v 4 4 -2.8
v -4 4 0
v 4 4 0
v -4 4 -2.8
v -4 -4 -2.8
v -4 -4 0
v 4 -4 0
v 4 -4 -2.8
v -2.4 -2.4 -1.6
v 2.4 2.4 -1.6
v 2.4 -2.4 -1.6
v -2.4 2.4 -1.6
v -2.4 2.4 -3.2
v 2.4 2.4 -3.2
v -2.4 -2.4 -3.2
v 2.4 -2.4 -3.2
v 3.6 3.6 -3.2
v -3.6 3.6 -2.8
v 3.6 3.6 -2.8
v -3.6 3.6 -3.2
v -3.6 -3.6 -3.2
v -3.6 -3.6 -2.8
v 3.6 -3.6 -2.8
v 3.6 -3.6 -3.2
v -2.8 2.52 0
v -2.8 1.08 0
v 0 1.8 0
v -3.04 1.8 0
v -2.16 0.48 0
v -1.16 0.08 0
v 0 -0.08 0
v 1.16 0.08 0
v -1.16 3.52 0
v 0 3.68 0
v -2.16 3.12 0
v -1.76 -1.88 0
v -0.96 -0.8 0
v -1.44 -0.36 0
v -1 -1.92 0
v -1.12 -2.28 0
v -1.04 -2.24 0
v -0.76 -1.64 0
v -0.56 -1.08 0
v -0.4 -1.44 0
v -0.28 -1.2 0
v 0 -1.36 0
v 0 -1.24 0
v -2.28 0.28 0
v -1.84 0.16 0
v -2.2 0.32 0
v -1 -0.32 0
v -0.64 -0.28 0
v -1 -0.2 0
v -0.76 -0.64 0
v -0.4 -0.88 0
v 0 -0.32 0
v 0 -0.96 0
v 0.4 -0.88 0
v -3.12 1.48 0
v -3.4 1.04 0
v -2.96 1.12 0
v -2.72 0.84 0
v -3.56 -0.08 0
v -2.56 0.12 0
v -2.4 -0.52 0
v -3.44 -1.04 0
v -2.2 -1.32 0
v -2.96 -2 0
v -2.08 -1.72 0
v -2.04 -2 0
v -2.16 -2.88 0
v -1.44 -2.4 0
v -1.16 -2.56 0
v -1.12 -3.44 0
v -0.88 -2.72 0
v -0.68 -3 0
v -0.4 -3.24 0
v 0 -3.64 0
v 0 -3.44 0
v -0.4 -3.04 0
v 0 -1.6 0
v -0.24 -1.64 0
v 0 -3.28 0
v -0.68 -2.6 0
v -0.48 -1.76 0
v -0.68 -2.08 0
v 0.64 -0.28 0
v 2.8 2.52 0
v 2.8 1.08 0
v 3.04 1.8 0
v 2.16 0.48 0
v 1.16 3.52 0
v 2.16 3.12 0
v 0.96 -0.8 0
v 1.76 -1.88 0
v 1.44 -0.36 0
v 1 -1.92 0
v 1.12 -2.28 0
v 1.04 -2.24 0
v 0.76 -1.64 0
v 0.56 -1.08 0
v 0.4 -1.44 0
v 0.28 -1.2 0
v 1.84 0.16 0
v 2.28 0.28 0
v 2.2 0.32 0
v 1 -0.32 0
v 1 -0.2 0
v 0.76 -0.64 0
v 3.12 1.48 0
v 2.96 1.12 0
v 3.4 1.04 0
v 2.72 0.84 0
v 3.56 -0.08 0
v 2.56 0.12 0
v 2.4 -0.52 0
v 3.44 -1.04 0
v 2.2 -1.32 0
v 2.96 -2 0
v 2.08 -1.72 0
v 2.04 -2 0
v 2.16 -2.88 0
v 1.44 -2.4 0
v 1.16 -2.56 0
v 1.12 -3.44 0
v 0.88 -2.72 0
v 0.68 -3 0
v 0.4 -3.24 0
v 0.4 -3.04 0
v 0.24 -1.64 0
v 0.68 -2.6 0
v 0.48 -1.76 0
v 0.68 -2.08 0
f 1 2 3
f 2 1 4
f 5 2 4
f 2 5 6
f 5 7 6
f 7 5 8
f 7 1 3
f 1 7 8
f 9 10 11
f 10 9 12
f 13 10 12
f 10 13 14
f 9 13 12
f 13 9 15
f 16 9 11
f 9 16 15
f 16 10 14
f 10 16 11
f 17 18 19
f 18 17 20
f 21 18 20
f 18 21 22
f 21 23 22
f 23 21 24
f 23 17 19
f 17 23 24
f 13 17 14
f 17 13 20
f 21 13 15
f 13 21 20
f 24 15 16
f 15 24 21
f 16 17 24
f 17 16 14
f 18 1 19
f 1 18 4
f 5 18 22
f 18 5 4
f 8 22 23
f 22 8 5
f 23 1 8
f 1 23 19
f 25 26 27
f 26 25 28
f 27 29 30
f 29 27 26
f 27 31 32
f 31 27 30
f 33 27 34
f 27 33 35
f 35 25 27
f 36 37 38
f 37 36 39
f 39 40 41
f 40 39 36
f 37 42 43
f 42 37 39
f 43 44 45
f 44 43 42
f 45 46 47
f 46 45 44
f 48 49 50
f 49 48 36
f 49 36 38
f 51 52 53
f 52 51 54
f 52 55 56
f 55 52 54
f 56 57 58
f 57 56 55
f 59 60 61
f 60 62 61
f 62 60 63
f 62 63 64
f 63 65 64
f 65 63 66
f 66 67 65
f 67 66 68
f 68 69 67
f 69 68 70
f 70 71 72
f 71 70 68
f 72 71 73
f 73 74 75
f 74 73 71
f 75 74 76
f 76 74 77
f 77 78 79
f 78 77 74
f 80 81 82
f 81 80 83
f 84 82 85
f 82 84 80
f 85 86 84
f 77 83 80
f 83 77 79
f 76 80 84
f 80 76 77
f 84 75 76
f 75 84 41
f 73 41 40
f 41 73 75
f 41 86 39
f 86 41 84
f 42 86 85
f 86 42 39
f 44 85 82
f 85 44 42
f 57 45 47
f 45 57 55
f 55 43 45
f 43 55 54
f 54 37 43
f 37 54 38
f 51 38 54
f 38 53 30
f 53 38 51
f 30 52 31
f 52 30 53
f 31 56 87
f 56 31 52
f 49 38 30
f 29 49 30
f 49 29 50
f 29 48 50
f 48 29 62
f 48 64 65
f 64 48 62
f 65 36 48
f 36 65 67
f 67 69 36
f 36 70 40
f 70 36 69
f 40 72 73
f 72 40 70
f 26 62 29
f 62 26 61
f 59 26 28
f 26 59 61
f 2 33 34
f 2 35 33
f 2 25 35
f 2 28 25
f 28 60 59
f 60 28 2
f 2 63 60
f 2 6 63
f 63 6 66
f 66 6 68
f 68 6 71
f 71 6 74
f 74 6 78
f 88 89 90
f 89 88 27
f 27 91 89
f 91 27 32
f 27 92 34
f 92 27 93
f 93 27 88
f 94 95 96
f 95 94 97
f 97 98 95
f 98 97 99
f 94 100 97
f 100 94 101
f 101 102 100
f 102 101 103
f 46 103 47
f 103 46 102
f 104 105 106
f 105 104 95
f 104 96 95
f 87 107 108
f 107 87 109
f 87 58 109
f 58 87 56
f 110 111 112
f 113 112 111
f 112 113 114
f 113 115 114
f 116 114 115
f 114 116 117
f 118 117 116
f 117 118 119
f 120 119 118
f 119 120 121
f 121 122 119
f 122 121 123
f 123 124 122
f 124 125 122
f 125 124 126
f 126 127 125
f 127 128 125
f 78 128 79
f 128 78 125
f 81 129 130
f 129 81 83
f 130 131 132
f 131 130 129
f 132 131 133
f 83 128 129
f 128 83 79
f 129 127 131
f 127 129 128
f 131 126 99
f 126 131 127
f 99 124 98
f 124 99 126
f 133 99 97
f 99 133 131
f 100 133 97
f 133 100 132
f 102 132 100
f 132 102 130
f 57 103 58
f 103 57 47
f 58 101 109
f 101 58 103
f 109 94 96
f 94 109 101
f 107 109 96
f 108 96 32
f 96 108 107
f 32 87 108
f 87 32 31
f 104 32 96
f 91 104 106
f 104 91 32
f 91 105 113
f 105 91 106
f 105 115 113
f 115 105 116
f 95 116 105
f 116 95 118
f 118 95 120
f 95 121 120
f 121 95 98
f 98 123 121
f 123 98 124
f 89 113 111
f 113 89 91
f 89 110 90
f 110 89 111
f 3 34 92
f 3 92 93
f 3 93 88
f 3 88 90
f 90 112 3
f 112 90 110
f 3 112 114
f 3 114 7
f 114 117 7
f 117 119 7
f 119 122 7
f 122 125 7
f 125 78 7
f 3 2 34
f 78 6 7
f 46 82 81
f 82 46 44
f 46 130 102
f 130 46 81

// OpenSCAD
// file: ../p/box5.scad
use <../lib.scad>
function ldraw_lib__box5() = [
// 0 Box with 5 Faces and All Edges
// 0 Name: box5.dat
// 0 Author: James Jessiman
// 0 !LDRAW_ORG Primitive UPDATE 2012-01
// 0 !LICENSE Licensed under CC BY 2.0 and CC BY 4.0 : see CAreadme.txt
// 
// 0 BFC CERTIFY CCW
  [0,"BFC","CERTIFY"],
  [0,"BFC","CCW"],
// 
// 0 !HISTORY 2002-04-03 [sbliss] Modified for BFC compliance
// 0 !HISTORY 2002-04-25 [PTadmin] Official Update 2002-02
// 0 !HISTORY 2007-06-24 [PTadmin] Header formatted for Contributor Agreement
// 0 !HISTORY 2008-07-01 [PTadmin] Official Update 2008-01
// 0 !HISTORY 2012-02-16 [Philo] Changed to CCW
// 0 !HISTORY 2012-03-30 [PTadmin] Official Update 2012-01
// 
// 
// 2 24 1 1 1 -1 1 1
  [2,24,1,1,1,-1,1,1],
// 2 24 -1 1 1 -1 1 -1
  [2,24,-1,1,1,-1,1,-1],
// 2 24 -1 1 -1 1 1 -1
  [2,24,-1,1,-1,1,1,-1],
// 2 24 1 1 -1 1 1 1
  [2,24,1,1,-1,1,1,1],
// 2 24 1 0 1 -1 0 1
  [2,24,1,0,1,-1,0,1],
// 2 24 -1 0 1 -1 0 -1
  [2,24,-1,0,1,-1,0,-1],
// 2 24 -1 0 -1 1 0 -1
  [2,24,-1,0,-1,1,0,-1],
// 2 24 1 0 -1 1 0 1
  [2,24,1,0,-1,1,0,1],
// 2 24 1 0 1 1 1 1
  [2,24,1,0,1,1,1,1],
// 2 24 -1 0 1 -1 1 1
  [2,24,-1,0,1,-1,1,1],
// 2 24 1 0 -1 1 1 -1
  [2,24,1,0,-1,1,1,-1],
// 2 24 -1 0 -1 -1 1 -1
  [2,24,-1,0,-1,-1,1,-1],
// 4 16 -1 1 1 1 1 1 1 1 -1 -1 1 -1
  [4,16,-1,1,1,1,1,1,1,1,-1,-1,1,-1],
// 4 16 -1 1 1 -1 0 1 1 0 1 1 1 1
  [4,16,-1,1,1,-1,0,1,1,0,1,1,1,1],
// 4 16 -1 1 -1 -1 0 -1 -1 0 1 -1 1 1
  [4,16,-1,1,-1,-1,0,-1,-1,0,1,-1,1,1],
// 4 16 1 1 -1 1 0 -1 -1 0 -1 -1 1 -1
  [4,16,1,1,-1,1,0,-1,-1,0,-1,-1,1,-1],
// 4 16 1 1 1 1 0 1 1 0 -1 1 1 -1
  [4,16,1,1,1,1,0,1,1,0,-1,1,1,-1],
];
module ldraw_lib__box5(step=0, col=false, unit=2/5, alt=false, line=0.2, solid=!$preview)
    makepoly(ldraw_lib__box5(), step=step, col=col, unit=unit, alt=alt, line=line, solid=solid);
ldraw_lib__box5(line=0.2);
// file: ../p/box4.scad
use <../lib.scad>
function ldraw_lib__box4() = [
// 0 Box with 4 Faces (2 Parallel Pairs) and All Edges
// 0 Name: box4.dat
// 0 Author: James Jessiman
// 0 !LDRAW_ORG Primitive UPDATE 2012-01
// 0 !LICENSE Licensed under CC BY 2.0 and CC BY 4.0 : see CAreadme.txt
// 
// 0 BFC CERTIFY CCW
  [0,"BFC","CERTIFY"],
  [0,"BFC","CCW"],
// 
// 0 !HISTORY 2002-04-03 [sbliss] Modified for BFC compliance
// 0 !HISTORY 2002-04-25 [PTadmin] Official Update 2002-02
// 0 !HISTORY 2007-06-24 [PTadmin] Header formatted for Contributor Agreement
// 0 !HISTORY 2008-07-01 [PTadmin] Official Update 2008-01
// 0 !HISTORY 2012-02-16 [Philo] Changed to CCW
// 0 !HISTORY 2012-03-30 [PTadmin] Official Update 2012-01
// 
// 
// 2 24 1 1 1 -1 1 1
  [2,24,1,1,1,-1,1,1],
// 2 24 -1 1 1 -1 1 -1
  [2,24,-1,1,1,-1,1,-1],
// 2 24 -1 1 -1 1 1 -1
  [2,24,-1,1,-1,1,1,-1],
// 2 24 1 1 -1 1 1 1
  [2,24,1,1,-1,1,1,1],
// 2 24 1 0 1 -1 0 1
  [2,24,1,0,1,-1,0,1],
// 2 24 -1 0 1 -1 0 -1
  [2,24,-1,0,1,-1,0,-1],
// 2 24 -1 0 -1 1 0 -1
  [2,24,-1,0,-1,1,0,-1],
// 2 24 1 0 -1 1 0 1
  [2,24,1,0,-1,1,0,1],
// 2 24 1 0 1 1 1 1
  [2,24,1,0,1,1,1,1],
// 2 24 -1 0 1 -1 1 1
  [2,24,-1,0,1,-1,1,1],
// 2 24 1 0 -1 1 1 -1
  [2,24,1,0,-1,1,1,-1],
// 2 24 -1 0 -1 -1 1 -1
  [2,24,-1,0,-1,-1,1,-1],
// 4 16 -1 1 1 -1 0 1 1 0 1 1 1 1
  [4,16,-1,1,1,-1,0,1,1,0,1,1,1,1],
// 4 16 -1 1 -1 -1 0 -1 -1 0 1 -1 1 1
  [4,16,-1,1,-1,-1,0,-1,-1,0,1,-1,1,1],
// 4 16 1 1 -1 1 0 -1 -1 0 -1 -1 1 -1
  [4,16,1,1,-1,1,0,-1,-1,0,-1,-1,1,-1],
// 4 16 1 1 1 1 0 1 1 0 -1 1 1 -1
  [4,16,1,1,1,1,0,1,1,0,-1,1,1,-1],
];
module ldraw_lib__box4(step=0, col=false, unit=2/5, alt=false, line=0.2, solid=!$preview)
    makepoly(ldraw_lib__box4(), step=step, col=col, unit=unit, alt=alt, line=line, solid=solid);
ldraw_lib__box4(line=0.2);
// file: s/3070bs01.scad
use <../../lib.scad>
use <../../p/box4.scad>
use <../../p/box5.scad>
function ldraw_lib__s__3070bs01() = [
// 0 ~Tile  1 x  1 with Groove without Top Face
// 0 Name: s\3070bs01.dat
// 0 Author: Chris Dee [cwdee]
// 0 !LDRAW_ORG Subpart UPDATE 2009-02
// 0 !LICENSE Licensed under CC BY 2.0 and CC BY 4.0 : see CAreadme.txt
// 
// 0 BFC CERTIFY CCW
  [0,"BFC","CERTIFY"],
  [0,"BFC","CCW"],
// 
// 0 !HISTORY 2009-09-03 [PTadmin] Official Update 2009-02
// 
// 
// 1 16 0 0 0 10 0 0 0 7 0 0 0 10 box4.dat
  [1,16,0,0,0,10,0,0,0,7,0,0,0,10, ldraw_lib__box4()],
// 0 BFC INVERTNEXT
  [0,"BFC","INVERTNEXT"],
// 1 16 0 8 0 6 0 0 0 -4 0 0 0 6 box5.dat
  [1,16,0,8,0,6,0,0,0,-4,0,0,0,6, ldraw_lib__box5()],
// 1 16 0 7 0 9 0 0 0 1 0 0 0 9 box4.dat
  [1,16,0,7,0,9,0,0,0,1,0,0,0,9, ldraw_lib__box4()],
// 
// 4 16 9 8 9 6 8 6 -6 8 6 -9 8 9
  [4,16,9,8,9,6,8,6,-6,8,6,-9,8,9],
// 4 16 -9 8 9 -6 8 6 -6 8 -6 -9 8 -9
  [4,16,-9,8,9,-6,8,6,-6,8,-6,-9,8,-9],
// 4 16 -9 8 -9 -6 8 -6 6 8 -6 9 8 -9
  [4,16,-9,8,-9,-6,8,-6,6,8,-6,9,8,-9],
// 4 16 9 8 -9 6 8 -6 6 8 6 9 8 9
  [4,16,9,8,-9,6,8,-6,6,8,6,9,8,9],
// 
// 4 16 10 7 10 9 7 9 -9 7 9 -10 7 10
  [4,16,10,7,10,9,7,9,-9,7,9,-10,7,10],
// 4 16 -10 7 10 -9 7 9 -9 7 -9 -10 7 -10
  [4,16,-10,7,10,-9,7,9,-9,7,-9,-10,7,-10],
// 4 16 -10 7 -10 -9 7 -9 9 7 -9 10 7 -10
  [4,16,-10,7,-10,-9,7,-9,9,7,-9,10,7,-10],
// 4 16 10 7 -10 9 7 -9 9 7 9 10 7 10
  [4,16,10,7,-10,9,7,-9,9,7,9,10,7,10],
// 0
];
module ldraw_lib__s__3070bs01(step=0, col=false, unit=2/5, alt=false, line=0.2, solid=!$preview)
    makepoly(ldraw_lib__s__3070bs01(), step=step, col=col, unit=unit, alt=alt, line=line, solid=solid);
ldraw_lib__s__3070bs01(line=0.2);
// main file
use <../lib.scad>
use <s/3070bs01.scad>
function ldraw_lib__3070bp60() = [
// 0 Tile  1 x  1 with Green Oval Pattern
// 0 Name: 3070bp60.dat
// 0 Author: Nils Schmidt [BlackBrick89]
// 0 !LDRAW_ORG Part UPDATE 2012-02
// 0 !LICENSE Licensed under CC BY 2.0 and CC BY 4.0 : see CAreadme.txt
// 
// 0 BFC CERTIFY CCW
  [0,"BFC","CERTIFY"],
  [0,"BFC","CCW"],
// 
// 0 !KEYWORDS Life on Mars
// 
// 0 !HISTORY 2012-08-09 [PTadmin] Official Update 2012-02
// 
// 
// 1 16 0 0 0 1 0 0 0 1 0 0 0 1 s\3070bs01.dat
  [1,16,0,0,0,1,0,0,0,1,0,0,0,1, ldraw_lib__s__3070bs01()],
// 
// 4 120 0 0 4.5 -7 0 6.3 -7.6 0 4.5 -7 0 2.7
  [4,120,0,0,4.5,-7,0,6.3,-7.6,0,4.5,-7,0,2.7],
// 4 120 0 0 4.5 -7 0 2.7 -5.4 0 1.2 -2.9 0 0.2
  [4,120,0,0,4.5,-7,0,2.7,-5.4,0,1.2,-2.9,0,0.2],
// 4 120 0 0 4.5 -2.9 0 0.2 0 0 -0.2 2.9 0 0.2
  [4,120,0,0,4.5,-2.9,0,0.2,0,0,-0.2,2.9,0,0.2],
// 4 120 0 0 4.5 0 0 9.2 -2.9 0 8.8 -5.4 0 7.8
  [4,120,0,0,4.5,0,0,9.2,-2.9,0,8.8,-5.4,0,7.8],
// 3 120 -5.4 0 7.8 -7 0 6.3 0 0 4.5
  [3,120,-5.4,0,7.8,-7,0,6.3,0,0,4.5],
// 4 120 -2.4 0 -2 -3.6 0 -0.9 -4.4 0 -4.7 -2.5 0 -4.8
  [4,120,-2.4,0,-2,-3.6,0,-0.9,-4.4,0,-4.7,-2.5,0,-4.8],
// 4 120 -4.4 0 -4.7 -2.8 0 -5.7 -2.6 0 -5.6 -2.5 0 -4.8
  [4,120,-4.4,0,-4.7,-2.8,0,-5.7,-2.6,0,-5.6,-2.5,0,-4.8],
// 4 120 -2.4 0 -2 -2.5 0 -4.8 -1.9 0 -4.1 -1.4 0 -2.7
  [4,120,-2.4,0,-2,-2.5,0,-4.8,-1.9,0,-4.1,-1.4,0,-2.7],
// 4 120 -1.4 0 -2.7 -1.9 0 -4.1 -1 0 -3.6 -0.7 0 -3
  [4,120,-1.4,0,-2.7,-1.9,0,-4.1,-1,0,-3.6,-0.7,0,-3],
// 4 120 -0.7 0 -3 -1 0 -3.6 0 0 -3.4 0 0 -3.1
  [4,120,-0.7,0,-3,-1,0,-3.6,0,0,-3.4,0,0,-3.1],
// 4 120 -5.5 0 0.8 -5.7 0 0.7 -4.4 0 -4.7 -4.6 0 0.4
  [4,120,-5.5,0,0.8,-5.7,0,0.7,-4.4,0,-4.7,-4.6,0,0.4],
// 3 120 -4.6 0 0.4 -4.4 0 -4.7 -3.6 0 -0.9
  [3,120,-4.6,0,0.4,-4.4,0,-4.7,-3.6,0,-0.9],
// 4 71 -1.6 0 -0.7 -2.5 0 -0.5 -2.5 0 -0.8 -1.9 0 -1.6
  [4,71,-1.6,0,-0.7,-2.5,0,-0.5,-2.5,0,-0.8,-1.9,0,-1.6],
// 4 71 -1.6 0 -0.7 -1.9 0 -1.6 -1 0 -2.2 0 0 -0.8
  [4,71,-1.6,0,-0.7,-1.9,0,-1.6,-1,0,-2.2,0,0,-0.8],
// 4 71 0 0 -0.8 -1 0 -2.2 0 0 -2.4 1 0 -2.2
  [4,71,0,0,-0.8,-1,0,-2.2,0,0,-2.4,1,0,-2.2],
// 3 71 -7.8 0 3.7 -8.5 0 2.6 -7.4 0 2.8
  [3,71,-7.8,0,3.7,-8.5,0,2.6,-7.4,0,2.8],
// 4 71 -6.8 0 2.1 -7.4 0 2.8 -8.5 0 2.6 -8.9 0 -0.2
  [4,71,-6.8,0,2.1,-7.4,0,2.8,-8.5,0,2.6,-8.9,0,-0.2],
// 3 71 -6.8 0 2.1 -8.9 0 -0.2 -6.4 0 0.3
  [3,71,-6.8,0,2.1,-8.9,0,-0.2,-6.4,0,0.3],
// 4 71 -8.9 0 -0.2 -8.6 0 -2.6 -6 0 -1.3 -6.4 0 0.3
  [4,71,-8.9,0,-0.2,-8.6,0,-2.6,-6,0,-1.3,-6.4,0,0.3],
// 4 71 -8.6 0 -2.6 -7.4 0 -5 -5.5 0 -3.3 -6 0 -1.3
  [4,71,-8.6,0,-2.6,-7.4,0,-5,-5.5,0,-3.3,-6,0,-1.3],
// 4 71 -7.4 0 -5 -5.1 0 -5 -5.2 0 -4.3 -5.5 0 -3.3
  [4,71,-7.4,0,-5,-5.1,0,-5,-5.2,0,-4.3,-5.5,0,-3.3],
// 4 71 -5.1 0 -5 -7.4 0 -5 -5.4 0 -7.2 -3.6 0 -6
  [4,71,-5.1,0,-5,-7.4,0,-5,-5.4,0,-7.2,-3.6,0,-6],
// 3 71 -3.6 0 -6 -5.4 0 -7.2 -2.9 0 -6.4
  [3,71,-3.6,0,-6,-5.4,0,-7.2,-2.9,0,-6.4],
// 4 71 -2.2 0 -6.8 -2.9 0 -6.4 -5.4 0 -7.2 -2.8 0 -8.6
  [4,71,-2.2,0,-6.8,-2.9,0,-6.4,-5.4,0,-7.2,-2.8,0,-8.6],
// 3 71 -2.2 0 -6.8 -2.8 0 -8.6 -1.7 0 -7.5
  [3,71,-2.2,0,-6.8,-2.8,0,-8.6,-1.7,0,-7.5],
// 3 71 -1.7 0 -7.5 -2.8 0 -8.6 -1 0 -8.1
  [3,71,-1.7,0,-7.5,-2.8,0,-8.6,-1,0,-8.1],
// 4 71 0 0 -8.6 -1 0 -8.1 -2.8 0 -8.6 0 0 -9.1
  [4,71,0,0,-8.6,-1,0,-8.1,-2.8,0,-8.6,0,0,-9.1],
// 4 4 0 0 -8.2 0 0 -4 -0.6 0 -4.1 -1 0 -7.6
  [4,4,0,0,-8.2,0,0,-4,-0.6,0,-4.1,-1,0,-7.6],
// 4 4 -1 0 -7.6 -0.6 0 -4.1 -1.2 0 -4.4 -1.7 0 -6.5
  [4,4,-1,0,-7.6,-0.6,0,-4.1,-1.2,0,-4.4,-1.7,0,-6.5],
// 3 4 -1.2 0 -4.4 -1.7 0 -5.2 -1.7 0 -6.5
  [3,4,-1.2,0,-4.4,-1.7,0,-5.2,-1.7,0,-6.5],
// 4 16 -1 0 -8.1 0 0 -8.6 0 0 -8.2 -1 0 -7.6
  [4,16,-1,0,-8.1,0,0,-8.6,0,0,-8.2,-1,0,-7.6],
// 4 16 -1.7 0 -7.5 -1 0 -8.1 -1 0 -7.6 -1.7 0 -6.5
  [4,16,-1.7,0,-7.5,-1,0,-8.1,-1,0,-7.6,-1.7,0,-6.5],
// 4 16 -2.2 0 -6.8 -1.7 0 -7.5 -1.7 0 -6.5 -2.6 0 -5.6
  [4,16,-2.2,0,-6.8,-1.7,0,-7.5,-1.7,0,-6.5,-2.6,0,-5.6],
// 4 16 -2.6 0 -5.6 -2.8 0 -5.7 -2.9 0 -6.4 -2.2 0 -6.8
  [4,16,-2.6,0,-5.6,-2.8,0,-5.7,-2.9,0,-6.4,-2.2,0,-6.8],
// 4 16 -1.7 0 -5.2 -2.5 0 -4.8 -2.6 0 -5.6 -1.7 0 -6.5
  [4,16,-1.7,0,-5.2,-2.5,0,-4.8,-2.6,0,-5.6,-1.7,0,-6.5],
// 4 16 -1.9 0 -4.1 -2.5 0 -4.8 -1.7 0 -5.2 -1.2 0 -4.4
  [4,16,-1.9,0,-4.1,-2.5,0,-4.8,-1.7,0,-5.2,-1.2,0,-4.4],
// 4 16 -1 0 -3.6 -1.9 0 -4.1 -1.2 0 -4.4 -0.6 0 -4.1
  [4,16,-1,0,-3.6,-1.9,0,-4.1,-1.2,0,-4.4,-0.6,0,-4.1],
// 4 16 -0.7 0 -3 0 0 -3.1 0 0 -2.4 -1 0 -2.2
  [4,16,-0.7,0,-3,0,0,-3.1,0,0,-2.4,-1,0,-2.2],
// 4 16 -1.4 0 -2.7 -0.7 0 -3 -1 0 -2.2 -1.9 0 -1.6
  [4,16,-1.4,0,-2.7,-0.7,0,-3,-1,0,-2.2,-1.9,0,-1.6],
// 4 16 -2.4 0 -2 -1.4 0 -2.7 -1.9 0 -1.6 -3.6 0 -0.9
  [4,16,-2.4,0,-2,-1.4,0,-2.7,-1.9,0,-1.6,-3.6,0,-0.9],
// 3 16 -2.5 0 -0.8 -3.6 0 -0.9 -1.9 0 -1.6
  [3,16,-2.5,0,-0.8,-3.6,0,-0.9,-1.9,0,-1.6],
// 4 16 -2.9 0 0.2 -3.6 0 -0.9 -2.5 0 -0.8 -2.5 0 -0.5
  [4,16,-2.9,0,0.2,-3.6,0,-0.9,-2.5,0,-0.8,-2.5,0,-0.5],
// 4 16 -2.9 0 0.2 -2.5 0 -0.5 -1.6 0 -0.7 0 0 -0.2
  [4,16,-2.9,0,0.2,-2.5,0,-0.5,-1.6,0,-0.7,0,0,-0.2],
// 4 16 0 0 -0.2 -1.6 0 -0.7 0 0 -0.8 1.6 0 -0.7
  [4,16,0,0,-0.2,-1.6,0,-0.7,0,0,-0.8,1.6,0,-0.7],
// 3 16 -4.6 0 0.4 -3.6 0 -0.9 -2.9 0 0.2
  [3,16,-4.6,0,0.4,-3.6,0,-0.9,-2.9,0,0.2],
// 4 16 -4.6 0 0.4 -2.9 0 0.2 -5.4 0 1.2 -5.5 0 0.8
  [4,16,-4.6,0,0.4,-2.9,0,0.2,-5.4,0,1.2,-5.5,0,0.8],
// 4 16 -5.7 0 0.7 -5.5 0 0.8 -5.4 0 1.2 -6.8 0 2.1
  [4,16,-5.7,0,0.7,-5.5,0,0.8,-5.4,0,1.2,-6.8,0,2.1],
// 4 16 -5.7 0 0.7 -6.8 0 2.1 -6.4 0 0.3 -6 0 -1.3
  [4,16,-5.7,0,0.7,-6.8,0,2.1,-6.4,0,0.3,-6,0,-1.3],
// 4 16 -4.4 0 -4.7 -5.7 0 0.7 -6 0 -1.3 -5.5 0 -3.3
  [4,16,-4.4,0,-4.7,-5.7,0,0.7,-6,0,-1.3,-5.5,0,-3.3],
// 3 16 -5.5 0 -3.3 -5.2 0 -4.3 -4.4 0 -4.7
  [3,16,-5.5,0,-3.3,-5.2,0,-4.3,-4.4,0,-4.7],
// 4 16 -4.4 0 -4.7 -5.2 0 -4.3 -5.1 0 -5 -2.8 0 -5.7
  [4,16,-4.4,0,-4.7,-5.2,0,-4.3,-5.1,0,-5,-2.8,0,-5.7],
// 4 16 -2.8 0 -5.7 -5.1 0 -5 -3.6 0 -6 -2.9 0 -6.4
  [4,16,-2.8,0,-5.7,-5.1,0,-5,-3.6,0,-6,-2.9,0,-6.4],
// 4 16 -6.8 0 2.1 -5.4 0 1.2 -7 0 2.7 -7.4 0 2.8
  [4,16,-6.8,0,2.1,-5.4,0,1.2,-7,0,2.7,-7.4,0,2.8],
// 4 16 -7.8 0 3.7 -7.4 0 2.8 -7 0 2.7 -7.6 0 4.5
  [4,16,-7.8,0,3.7,-7.4,0,2.8,-7,0,2.7,-7.6,0,4.5],
// 3 16 -10 0 10 -2.9 0 8.8 0 0 9.2
  [3,16,-10,0,10,-2.9,0,8.8,0,0,9.2],
// 3 16 -10 0 10 -5.4 0 7.8 -2.9 0 8.8
  [3,16,-10,0,10,-5.4,0,7.8,-2.9,0,8.8],
// 3 16 -10 0 10 -7 0 6.3 -5.4 0 7.8
  [3,16,-10,0,10,-7,0,6.3,-5.4,0,7.8],
// 3 16 -10 0 10 -7.6 0 4.5 -7 0 6.3
  [3,16,-10,0,10,-7.6,0,4.5,-7,0,6.3],
// 4 16 -7.8 0 3.7 -7.6 0 4.5 -10 0 10 -8.5 0 2.6
  [4,16,-7.8,0,3.7,-7.6,0,4.5,-10,0,10,-8.5,0,2.6],
// 3 16 -10 0 10 -8.9 0 -0.2 -8.5 0 2.6
  [3,16,-10,0,10,-8.9,0,-0.2,-8.5,0,2.6],
// 3 16 -10 0 10 -10 0 -10 -8.9 0 -0.2
  [3,16,-10,0,10,-10,0,-10,-8.9,0,-0.2],
// 3 16 -8.9 0 -0.2 -10 0 -10 -8.6 0 -2.6
  [3,16,-8.9,0,-0.2,-10,0,-10,-8.6,0,-2.6],
// 3 16 -8.6 0 -2.6 -10 0 -10 -7.4 0 -5
  [3,16,-8.6,0,-2.6,-10,0,-10,-7.4,0,-5],
// 3 16 -7.4 0 -5 -10 0 -10 -5.4 0 -7.2
  [3,16,-7.4,0,-5,-10,0,-10,-5.4,0,-7.2],
// 3 16 -5.4 0 -7.2 -10 0 -10 -2.8 0 -8.6
  [3,16,-5.4,0,-7.2,-10,0,-10,-2.8,0,-8.6],
// 3 16 -2.8 0 -8.6 -10 0 -10 0 0 -9.1
  [3,16,-2.8,0,-8.6,-10,0,-10,0,0,-9.1],
// 4 120 7.6 0 4.5 7 0 6.3 0 0 4.5 7 0 2.7
  [4,120,7.6,0,4.5,7,0,6.3,0,0,4.5,7,0,2.7],
// 4 120 5.4 0 1.2 7 0 2.7 0 0 4.5 2.9 0 0.2
  [4,120,5.4,0,1.2,7,0,2.7,0,0,4.5,2.9,0,0.2],
// 4 120 2.9 0 8.8 0 0 9.2 0 0 4.5 5.4 0 7.8
  [4,120,2.9,0,8.8,0,0,9.2,0,0,4.5,5.4,0,7.8],
// 3 120 5.4 0 7.8 0 0 4.5 7 0 6.3
  [3,120,5.4,0,7.8,0,0,4.5,7,0,6.3],
// 4 120 4.4 0 -4.7 3.6 0 -0.9 2.4 0 -2 2.5 0 -4.8
  [4,120,4.4,0,-4.7,3.6,0,-0.9,2.4,0,-2,2.5,0,-4.8],
// 4 120 2.6 0 -5.6 2.8 0 -5.7 4.4 0 -4.7 2.5 0 -4.8
  [4,120,2.6,0,-5.6,2.8,0,-5.7,4.4,0,-4.7,2.5,0,-4.8],
// 4 120 1.9 0 -4.1 2.5 0 -4.8 2.4 0 -2 1.4 0 -2.7
  [4,120,1.9,0,-4.1,2.5,0,-4.8,2.4,0,-2,1.4,0,-2.7],
// 4 120 1 0 -3.6 1.9 0 -4.1 1.4 0 -2.7 0.7 0 -3
  [4,120,1,0,-3.6,1.9,0,-4.1,1.4,0,-2.7,0.7,0,-3],
// 4 120 0 0 -3.4 1 0 -3.6 0.7 0 -3 0 0 -3.1
  [4,120,0,0,-3.4,1,0,-3.6,0.7,0,-3,0,0,-3.1],
// 4 120 4.4 0 -4.7 5.7 0 0.7 5.5 0 0.8 4.6 0 0.4
  [4,120,4.4,0,-4.7,5.7,0,0.7,5.5,0,0.8,4.6,0,0.4],
// 3 120 4.6 0 0.4 3.6 0 -0.9 4.4 0 -4.7
  [3,120,4.6,0,0.4,3.6,0,-0.9,4.4,0,-4.7],
// 4 71 2.5 0 -0.8 2.5 0 -0.5 1.6 0 -0.7 1.9 0 -1.6
  [4,71,2.5,0,-0.8,2.5,0,-0.5,1.6,0,-0.7,1.9,0,-1.6],
// 4 71 1 0 -2.2 1.9 0 -1.6 1.6 0 -0.7 0 0 -0.8
  [4,71,1,0,-2.2,1.9,0,-1.6,1.6,0,-0.7,0,0,-0.8],
// 3 71 7.8 0 3.7 7.4 0 2.8 8.5 0 2.6
  [3,71,7.8,0,3.7,7.4,0,2.8,8.5,0,2.6],
// 4 71 8.5 0 2.6 7.4 0 2.8 6.8 0 2.1 8.9 0 -0.2
  [4,71,8.5,0,2.6,7.4,0,2.8,6.8,0,2.1,8.9,0,-0.2],
// 3 71 6.8 0 2.1 6.4 0 0.3 8.9 0 -0.2
  [3,71,6.8,0,2.1,6.4,0,0.3,8.9,0,-0.2],
// 4 71 6 0 -1.3 8.6 0 -2.6 8.9 0 -0.2 6.4 0 0.3
  [4,71,6,0,-1.3,8.6,0,-2.6,8.9,0,-0.2,6.4,0,0.3],
// 4 71 5.5 0 -3.3 7.4 0 -5 8.6 0 -2.6 6 0 -1.3
  [4,71,5.5,0,-3.3,7.4,0,-5,8.6,0,-2.6,6,0,-1.3],
// 4 71 5.2 0 -4.3 5.1 0 -5 7.4 0 -5 5.5 0 -3.3
  [4,71,5.2,0,-4.3,5.1,0,-5,7.4,0,-5,5.5,0,-3.3],
// 4 71 5.4 0 -7.2 7.4 0 -5 5.1 0 -5 3.6 0 -6
  [4,71,5.4,0,-7.2,7.4,0,-5,5.1,0,-5,3.6,0,-6],
// 3 71 3.6 0 -6 2.9 0 -6.4 5.4 0 -7.2
  [3,71,3.6,0,-6,2.9,0,-6.4,5.4,0,-7.2],
// 4 71 5.4 0 -7.2 2.9 0 -6.4 2.2 0 -6.8 2.8 0 -8.6
  [4,71,5.4,0,-7.2,2.9,0,-6.4,2.2,0,-6.8,2.8,0,-8.6],
// 3 71 2.2 0 -6.8 1.7 0 -7.5 2.8 0 -8.6
  [3,71,2.2,0,-6.8,1.7,0,-7.5,2.8,0,-8.6],
// 3 71 1.7 0 -7.5 1 0 -8.1 2.8 0 -8.6
  [3,71,1.7,0,-7.5,1,0,-8.1,2.8,0,-8.6],
// 4 71 2.8 0 -8.6 1 0 -8.1 0 0 -8.6 0 0 -9.1
  [4,71,2.8,0,-8.6,1,0,-8.1,0,0,-8.6,0,0,-9.1],
// 4 4 0.6 0 -4.1 0 0 -4 0 0 -8.2 1 0 -7.6
  [4,4,0.6,0,-4.1,0,0,-4,0,0,-8.2,1,0,-7.6],
// 4 4 1.2 0 -4.4 0.6 0 -4.1 1 0 -7.6 1.7 0 -6.5
  [4,4,1.2,0,-4.4,0.6,0,-4.1,1,0,-7.6,1.7,0,-6.5],
// 3 4 1.2 0 -4.4 1.7 0 -6.5 1.7 0 -5.2
  [3,4,1.2,0,-4.4,1.7,0,-6.5,1.7,0,-5.2],
// 4 16 0 0 -8.2 0 0 -8.6 1 0 -8.1 1 0 -7.6
  [4,16,0,0,-8.2,0,0,-8.6,1,0,-8.1,1,0,-7.6],
// 4 16 1 0 -7.6 1 0 -8.1 1.7 0 -7.5 1.7 0 -6.5
  [4,16,1,0,-7.6,1,0,-8.1,1.7,0,-7.5,1.7,0,-6.5],
// 4 16 1.7 0 -6.5 1.7 0 -7.5 2.2 0 -6.8 2.6 0 -5.6
  [4,16,1.7,0,-6.5,1.7,0,-7.5,2.2,0,-6.8,2.6,0,-5.6],
// 4 16 2.9 0 -6.4 2.8 0 -5.7 2.6 0 -5.6 2.2 0 -6.8
  [4,16,2.9,0,-6.4,2.8,0,-5.7,2.6,0,-5.6,2.2,0,-6.8],
// 4 16 2.6 0 -5.6 2.5 0 -4.8 1.7 0 -5.2 1.7 0 -6.5
  [4,16,2.6,0,-5.6,2.5,0,-4.8,1.7,0,-5.2,1.7,0,-6.5],
// 4 16 1.7 0 -5.2 2.5 0 -4.8 1.9 0 -4.1 1.2 0 -4.4
  [4,16,1.7,0,-5.2,2.5,0,-4.8,1.9,0,-4.1,1.2,0,-4.4],
// 4 16 1.2 0 -4.4 1.9 0 -4.1 1 0 -3.6 0.6 0 -4.1
  [4,16,1.2,0,-4.4,1.9,0,-4.1,1,0,-3.6,0.6,0,-4.1],
// 4 16 0 0 -2.4 0 0 -3.1 0.7 0 -3 1 0 -2.2
  [4,16,0,0,-2.4,0,0,-3.1,0.7,0,-3,1,0,-2.2],
// 4 16 1 0 -2.2 0.7 0 -3 1.4 0 -2.7 1.9 0 -1.6
  [4,16,1,0,-2.2,0.7,0,-3,1.4,0,-2.7,1.9,0,-1.6],
// 4 16 1.9 0 -1.6 1.4 0 -2.7 2.4 0 -2 3.6 0 -0.9
  [4,16,1.9,0,-1.6,1.4,0,-2.7,2.4,0,-2,3.6,0,-0.9],
// 3 16 2.5 0 -0.8 1.9 0 -1.6 3.6 0 -0.9
  [3,16,2.5,0,-0.8,1.9,0,-1.6,3.6,0,-0.9],
// 4 16 2.5 0 -0.8 3.6 0 -0.9 2.9 0 0.2 2.5 0 -0.5
  [4,16,2.5,0,-0.8,3.6,0,-0.9,2.9,0,0.2,2.5,0,-0.5],
// 4 16 1.6 0 -0.7 2.5 0 -0.5 2.9 0 0.2 0 0 -0.2
  [4,16,1.6,0,-0.7,2.5,0,-0.5,2.9,0,0.2,0,0,-0.2],
// 3 16 4.6 0 0.4 2.9 0 0.2 3.6 0 -0.9
  [3,16,4.6,0,0.4,2.9,0,0.2,3.6,0,-0.9],
// 4 16 5.4 0 1.2 2.9 0 0.2 4.6 0 0.4 5.5 0 0.8
  [4,16,5.4,0,1.2,2.9,0,0.2,4.6,0,0.4,5.5,0,0.8],
// 4 16 5.4 0 1.2 5.5 0 0.8 5.7 0 0.7 6.8 0 2.1
  [4,16,5.4,0,1.2,5.5,0,0.8,5.7,0,0.7,6.8,0,2.1],
// 4 16 6.4 0 0.3 6.8 0 2.1 5.7 0 0.7 6 0 -1.3
  [4,16,6.4,0,0.3,6.8,0,2.1,5.7,0,0.7,6,0,-1.3],
// 4 16 6 0 -1.3 5.7 0 0.7 4.4 0 -4.7 5.5 0 -3.3
  [4,16,6,0,-1.3,5.7,0,0.7,4.4,0,-4.7,5.5,0,-3.3],
// 3 16 5.5 0 -3.3 4.4 0 -4.7 5.2 0 -4.3
  [3,16,5.5,0,-3.3,4.4,0,-4.7,5.2,0,-4.3],
// 4 16 5.1 0 -5 5.2 0 -4.3 4.4 0 -4.7 2.8 0 -5.7
  [4,16,5.1,0,-5,5.2,0,-4.3,4.4,0,-4.7,2.8,0,-5.7],
// 4 16 3.6 0 -6 5.1 0 -5 2.8 0 -5.7 2.9 0 -6.4
  [4,16,3.6,0,-6,5.1,0,-5,2.8,0,-5.7,2.9,0,-6.4],
// 4 16 7 0 2.7 5.4 0 1.2 6.8 0 2.1 7.4 0 2.8
  [4,16,7,0,2.7,5.4,0,1.2,6.8,0,2.1,7.4,0,2.8],
// 4 16 7 0 2.7 7.4 0 2.8 7.8 0 3.7 7.6 0 4.5
  [4,16,7,0,2.7,7.4,0,2.8,7.8,0,3.7,7.6,0,4.5],
// 3 16 10 0 10 0 0 9.2 2.9 0 8.8
  [3,16,10,0,10,0,0,9.2,2.9,0,8.8],
// 3 16 10 0 10 2.9 0 8.8 5.4 0 7.8
  [3,16,10,0,10,2.9,0,8.8,5.4,0,7.8],
// 3 16 10 0 10 5.4 0 7.8 7 0 6.3
  [3,16,10,0,10,5.4,0,7.8,7,0,6.3],
// 3 16 10 0 10 7 0 6.3 7.6 0 4.5
  [3,16,10,0,10,7,0,6.3,7.6,0,4.5],
// 4 16 10 0 10 7.6 0 4.5 7.8 0 3.7 8.5 0 2.6
  [4,16,10,0,10,7.6,0,4.5,7.8,0,3.7,8.5,0,2.6],
// 3 16 10 0 10 8.5 0 2.6 8.9 0 -0.2
  [3,16,10,0,10,8.5,0,2.6,8.9,0,-0.2],
// 3 16 10 0 10 8.9 0 -0.2 10 0 -10
  [3,16,10,0,10,8.9,0,-0.2,10,0,-10],
// 3 16 8.9 0 -0.2 8.6 0 -2.6 10 0 -10
  [3,16,8.9,0,-0.2,8.6,0,-2.6,10,0,-10],
// 3 16 8.6 0 -2.6 7.4 0 -5 10 0 -10
  [3,16,8.6,0,-2.6,7.4,0,-5,10,0,-10],
// 3 16 7.4 0 -5 5.4 0 -7.2 10 0 -10
  [3,16,7.4,0,-5,5.4,0,-7.2,10,0,-10],
// 3 16 5.4 0 -7.2 2.8 0 -8.6 10 0 -10
  [3,16,5.4,0,-7.2,2.8,0,-8.6,10,0,-10],
// 3 16 2.8 0 -8.6 0 0 -9.1 10 0 -10
  [3,16,2.8,0,-8.6,0,0,-9.1,10,0,-10],
// 3 16 10 0 10 -10 0 10 0 0 9.2
  [3,16,10,0,10,-10,0,10,0,0,9.2],
// 3 16 0 0 -9.1 -10 0 -10 10 0 -10
  [3,16,0,0,-9.1,-10,0,-10,10,0,-10],
// 4 16 -1 0 -3.6 -0.6 0 -4.1 0 0 -4 0 0 -3.4
  [4,16,-1,0,-3.6,-0.6,0,-4.1,0,0,-4,0,0,-3.4],
// 4 16 1 0 -3.6 0 0 -3.4 0 0 -4 0.6 0 -4.1
  [4,16,1,0,-3.6,0,0,-3.4,0,0,-4,0.6,0,-4.1],
];
module ldraw_lib__3070bp60(step=0, col=false, unit=2/5, alt=false, line=0.2, solid=!$preview)
    makepoly(ldraw_lib__3070bp60(), step=step, col=col, unit=unit, alt=alt, line=line, solid=solid);
ldraw_lib__3070bp60(line=0.2);
